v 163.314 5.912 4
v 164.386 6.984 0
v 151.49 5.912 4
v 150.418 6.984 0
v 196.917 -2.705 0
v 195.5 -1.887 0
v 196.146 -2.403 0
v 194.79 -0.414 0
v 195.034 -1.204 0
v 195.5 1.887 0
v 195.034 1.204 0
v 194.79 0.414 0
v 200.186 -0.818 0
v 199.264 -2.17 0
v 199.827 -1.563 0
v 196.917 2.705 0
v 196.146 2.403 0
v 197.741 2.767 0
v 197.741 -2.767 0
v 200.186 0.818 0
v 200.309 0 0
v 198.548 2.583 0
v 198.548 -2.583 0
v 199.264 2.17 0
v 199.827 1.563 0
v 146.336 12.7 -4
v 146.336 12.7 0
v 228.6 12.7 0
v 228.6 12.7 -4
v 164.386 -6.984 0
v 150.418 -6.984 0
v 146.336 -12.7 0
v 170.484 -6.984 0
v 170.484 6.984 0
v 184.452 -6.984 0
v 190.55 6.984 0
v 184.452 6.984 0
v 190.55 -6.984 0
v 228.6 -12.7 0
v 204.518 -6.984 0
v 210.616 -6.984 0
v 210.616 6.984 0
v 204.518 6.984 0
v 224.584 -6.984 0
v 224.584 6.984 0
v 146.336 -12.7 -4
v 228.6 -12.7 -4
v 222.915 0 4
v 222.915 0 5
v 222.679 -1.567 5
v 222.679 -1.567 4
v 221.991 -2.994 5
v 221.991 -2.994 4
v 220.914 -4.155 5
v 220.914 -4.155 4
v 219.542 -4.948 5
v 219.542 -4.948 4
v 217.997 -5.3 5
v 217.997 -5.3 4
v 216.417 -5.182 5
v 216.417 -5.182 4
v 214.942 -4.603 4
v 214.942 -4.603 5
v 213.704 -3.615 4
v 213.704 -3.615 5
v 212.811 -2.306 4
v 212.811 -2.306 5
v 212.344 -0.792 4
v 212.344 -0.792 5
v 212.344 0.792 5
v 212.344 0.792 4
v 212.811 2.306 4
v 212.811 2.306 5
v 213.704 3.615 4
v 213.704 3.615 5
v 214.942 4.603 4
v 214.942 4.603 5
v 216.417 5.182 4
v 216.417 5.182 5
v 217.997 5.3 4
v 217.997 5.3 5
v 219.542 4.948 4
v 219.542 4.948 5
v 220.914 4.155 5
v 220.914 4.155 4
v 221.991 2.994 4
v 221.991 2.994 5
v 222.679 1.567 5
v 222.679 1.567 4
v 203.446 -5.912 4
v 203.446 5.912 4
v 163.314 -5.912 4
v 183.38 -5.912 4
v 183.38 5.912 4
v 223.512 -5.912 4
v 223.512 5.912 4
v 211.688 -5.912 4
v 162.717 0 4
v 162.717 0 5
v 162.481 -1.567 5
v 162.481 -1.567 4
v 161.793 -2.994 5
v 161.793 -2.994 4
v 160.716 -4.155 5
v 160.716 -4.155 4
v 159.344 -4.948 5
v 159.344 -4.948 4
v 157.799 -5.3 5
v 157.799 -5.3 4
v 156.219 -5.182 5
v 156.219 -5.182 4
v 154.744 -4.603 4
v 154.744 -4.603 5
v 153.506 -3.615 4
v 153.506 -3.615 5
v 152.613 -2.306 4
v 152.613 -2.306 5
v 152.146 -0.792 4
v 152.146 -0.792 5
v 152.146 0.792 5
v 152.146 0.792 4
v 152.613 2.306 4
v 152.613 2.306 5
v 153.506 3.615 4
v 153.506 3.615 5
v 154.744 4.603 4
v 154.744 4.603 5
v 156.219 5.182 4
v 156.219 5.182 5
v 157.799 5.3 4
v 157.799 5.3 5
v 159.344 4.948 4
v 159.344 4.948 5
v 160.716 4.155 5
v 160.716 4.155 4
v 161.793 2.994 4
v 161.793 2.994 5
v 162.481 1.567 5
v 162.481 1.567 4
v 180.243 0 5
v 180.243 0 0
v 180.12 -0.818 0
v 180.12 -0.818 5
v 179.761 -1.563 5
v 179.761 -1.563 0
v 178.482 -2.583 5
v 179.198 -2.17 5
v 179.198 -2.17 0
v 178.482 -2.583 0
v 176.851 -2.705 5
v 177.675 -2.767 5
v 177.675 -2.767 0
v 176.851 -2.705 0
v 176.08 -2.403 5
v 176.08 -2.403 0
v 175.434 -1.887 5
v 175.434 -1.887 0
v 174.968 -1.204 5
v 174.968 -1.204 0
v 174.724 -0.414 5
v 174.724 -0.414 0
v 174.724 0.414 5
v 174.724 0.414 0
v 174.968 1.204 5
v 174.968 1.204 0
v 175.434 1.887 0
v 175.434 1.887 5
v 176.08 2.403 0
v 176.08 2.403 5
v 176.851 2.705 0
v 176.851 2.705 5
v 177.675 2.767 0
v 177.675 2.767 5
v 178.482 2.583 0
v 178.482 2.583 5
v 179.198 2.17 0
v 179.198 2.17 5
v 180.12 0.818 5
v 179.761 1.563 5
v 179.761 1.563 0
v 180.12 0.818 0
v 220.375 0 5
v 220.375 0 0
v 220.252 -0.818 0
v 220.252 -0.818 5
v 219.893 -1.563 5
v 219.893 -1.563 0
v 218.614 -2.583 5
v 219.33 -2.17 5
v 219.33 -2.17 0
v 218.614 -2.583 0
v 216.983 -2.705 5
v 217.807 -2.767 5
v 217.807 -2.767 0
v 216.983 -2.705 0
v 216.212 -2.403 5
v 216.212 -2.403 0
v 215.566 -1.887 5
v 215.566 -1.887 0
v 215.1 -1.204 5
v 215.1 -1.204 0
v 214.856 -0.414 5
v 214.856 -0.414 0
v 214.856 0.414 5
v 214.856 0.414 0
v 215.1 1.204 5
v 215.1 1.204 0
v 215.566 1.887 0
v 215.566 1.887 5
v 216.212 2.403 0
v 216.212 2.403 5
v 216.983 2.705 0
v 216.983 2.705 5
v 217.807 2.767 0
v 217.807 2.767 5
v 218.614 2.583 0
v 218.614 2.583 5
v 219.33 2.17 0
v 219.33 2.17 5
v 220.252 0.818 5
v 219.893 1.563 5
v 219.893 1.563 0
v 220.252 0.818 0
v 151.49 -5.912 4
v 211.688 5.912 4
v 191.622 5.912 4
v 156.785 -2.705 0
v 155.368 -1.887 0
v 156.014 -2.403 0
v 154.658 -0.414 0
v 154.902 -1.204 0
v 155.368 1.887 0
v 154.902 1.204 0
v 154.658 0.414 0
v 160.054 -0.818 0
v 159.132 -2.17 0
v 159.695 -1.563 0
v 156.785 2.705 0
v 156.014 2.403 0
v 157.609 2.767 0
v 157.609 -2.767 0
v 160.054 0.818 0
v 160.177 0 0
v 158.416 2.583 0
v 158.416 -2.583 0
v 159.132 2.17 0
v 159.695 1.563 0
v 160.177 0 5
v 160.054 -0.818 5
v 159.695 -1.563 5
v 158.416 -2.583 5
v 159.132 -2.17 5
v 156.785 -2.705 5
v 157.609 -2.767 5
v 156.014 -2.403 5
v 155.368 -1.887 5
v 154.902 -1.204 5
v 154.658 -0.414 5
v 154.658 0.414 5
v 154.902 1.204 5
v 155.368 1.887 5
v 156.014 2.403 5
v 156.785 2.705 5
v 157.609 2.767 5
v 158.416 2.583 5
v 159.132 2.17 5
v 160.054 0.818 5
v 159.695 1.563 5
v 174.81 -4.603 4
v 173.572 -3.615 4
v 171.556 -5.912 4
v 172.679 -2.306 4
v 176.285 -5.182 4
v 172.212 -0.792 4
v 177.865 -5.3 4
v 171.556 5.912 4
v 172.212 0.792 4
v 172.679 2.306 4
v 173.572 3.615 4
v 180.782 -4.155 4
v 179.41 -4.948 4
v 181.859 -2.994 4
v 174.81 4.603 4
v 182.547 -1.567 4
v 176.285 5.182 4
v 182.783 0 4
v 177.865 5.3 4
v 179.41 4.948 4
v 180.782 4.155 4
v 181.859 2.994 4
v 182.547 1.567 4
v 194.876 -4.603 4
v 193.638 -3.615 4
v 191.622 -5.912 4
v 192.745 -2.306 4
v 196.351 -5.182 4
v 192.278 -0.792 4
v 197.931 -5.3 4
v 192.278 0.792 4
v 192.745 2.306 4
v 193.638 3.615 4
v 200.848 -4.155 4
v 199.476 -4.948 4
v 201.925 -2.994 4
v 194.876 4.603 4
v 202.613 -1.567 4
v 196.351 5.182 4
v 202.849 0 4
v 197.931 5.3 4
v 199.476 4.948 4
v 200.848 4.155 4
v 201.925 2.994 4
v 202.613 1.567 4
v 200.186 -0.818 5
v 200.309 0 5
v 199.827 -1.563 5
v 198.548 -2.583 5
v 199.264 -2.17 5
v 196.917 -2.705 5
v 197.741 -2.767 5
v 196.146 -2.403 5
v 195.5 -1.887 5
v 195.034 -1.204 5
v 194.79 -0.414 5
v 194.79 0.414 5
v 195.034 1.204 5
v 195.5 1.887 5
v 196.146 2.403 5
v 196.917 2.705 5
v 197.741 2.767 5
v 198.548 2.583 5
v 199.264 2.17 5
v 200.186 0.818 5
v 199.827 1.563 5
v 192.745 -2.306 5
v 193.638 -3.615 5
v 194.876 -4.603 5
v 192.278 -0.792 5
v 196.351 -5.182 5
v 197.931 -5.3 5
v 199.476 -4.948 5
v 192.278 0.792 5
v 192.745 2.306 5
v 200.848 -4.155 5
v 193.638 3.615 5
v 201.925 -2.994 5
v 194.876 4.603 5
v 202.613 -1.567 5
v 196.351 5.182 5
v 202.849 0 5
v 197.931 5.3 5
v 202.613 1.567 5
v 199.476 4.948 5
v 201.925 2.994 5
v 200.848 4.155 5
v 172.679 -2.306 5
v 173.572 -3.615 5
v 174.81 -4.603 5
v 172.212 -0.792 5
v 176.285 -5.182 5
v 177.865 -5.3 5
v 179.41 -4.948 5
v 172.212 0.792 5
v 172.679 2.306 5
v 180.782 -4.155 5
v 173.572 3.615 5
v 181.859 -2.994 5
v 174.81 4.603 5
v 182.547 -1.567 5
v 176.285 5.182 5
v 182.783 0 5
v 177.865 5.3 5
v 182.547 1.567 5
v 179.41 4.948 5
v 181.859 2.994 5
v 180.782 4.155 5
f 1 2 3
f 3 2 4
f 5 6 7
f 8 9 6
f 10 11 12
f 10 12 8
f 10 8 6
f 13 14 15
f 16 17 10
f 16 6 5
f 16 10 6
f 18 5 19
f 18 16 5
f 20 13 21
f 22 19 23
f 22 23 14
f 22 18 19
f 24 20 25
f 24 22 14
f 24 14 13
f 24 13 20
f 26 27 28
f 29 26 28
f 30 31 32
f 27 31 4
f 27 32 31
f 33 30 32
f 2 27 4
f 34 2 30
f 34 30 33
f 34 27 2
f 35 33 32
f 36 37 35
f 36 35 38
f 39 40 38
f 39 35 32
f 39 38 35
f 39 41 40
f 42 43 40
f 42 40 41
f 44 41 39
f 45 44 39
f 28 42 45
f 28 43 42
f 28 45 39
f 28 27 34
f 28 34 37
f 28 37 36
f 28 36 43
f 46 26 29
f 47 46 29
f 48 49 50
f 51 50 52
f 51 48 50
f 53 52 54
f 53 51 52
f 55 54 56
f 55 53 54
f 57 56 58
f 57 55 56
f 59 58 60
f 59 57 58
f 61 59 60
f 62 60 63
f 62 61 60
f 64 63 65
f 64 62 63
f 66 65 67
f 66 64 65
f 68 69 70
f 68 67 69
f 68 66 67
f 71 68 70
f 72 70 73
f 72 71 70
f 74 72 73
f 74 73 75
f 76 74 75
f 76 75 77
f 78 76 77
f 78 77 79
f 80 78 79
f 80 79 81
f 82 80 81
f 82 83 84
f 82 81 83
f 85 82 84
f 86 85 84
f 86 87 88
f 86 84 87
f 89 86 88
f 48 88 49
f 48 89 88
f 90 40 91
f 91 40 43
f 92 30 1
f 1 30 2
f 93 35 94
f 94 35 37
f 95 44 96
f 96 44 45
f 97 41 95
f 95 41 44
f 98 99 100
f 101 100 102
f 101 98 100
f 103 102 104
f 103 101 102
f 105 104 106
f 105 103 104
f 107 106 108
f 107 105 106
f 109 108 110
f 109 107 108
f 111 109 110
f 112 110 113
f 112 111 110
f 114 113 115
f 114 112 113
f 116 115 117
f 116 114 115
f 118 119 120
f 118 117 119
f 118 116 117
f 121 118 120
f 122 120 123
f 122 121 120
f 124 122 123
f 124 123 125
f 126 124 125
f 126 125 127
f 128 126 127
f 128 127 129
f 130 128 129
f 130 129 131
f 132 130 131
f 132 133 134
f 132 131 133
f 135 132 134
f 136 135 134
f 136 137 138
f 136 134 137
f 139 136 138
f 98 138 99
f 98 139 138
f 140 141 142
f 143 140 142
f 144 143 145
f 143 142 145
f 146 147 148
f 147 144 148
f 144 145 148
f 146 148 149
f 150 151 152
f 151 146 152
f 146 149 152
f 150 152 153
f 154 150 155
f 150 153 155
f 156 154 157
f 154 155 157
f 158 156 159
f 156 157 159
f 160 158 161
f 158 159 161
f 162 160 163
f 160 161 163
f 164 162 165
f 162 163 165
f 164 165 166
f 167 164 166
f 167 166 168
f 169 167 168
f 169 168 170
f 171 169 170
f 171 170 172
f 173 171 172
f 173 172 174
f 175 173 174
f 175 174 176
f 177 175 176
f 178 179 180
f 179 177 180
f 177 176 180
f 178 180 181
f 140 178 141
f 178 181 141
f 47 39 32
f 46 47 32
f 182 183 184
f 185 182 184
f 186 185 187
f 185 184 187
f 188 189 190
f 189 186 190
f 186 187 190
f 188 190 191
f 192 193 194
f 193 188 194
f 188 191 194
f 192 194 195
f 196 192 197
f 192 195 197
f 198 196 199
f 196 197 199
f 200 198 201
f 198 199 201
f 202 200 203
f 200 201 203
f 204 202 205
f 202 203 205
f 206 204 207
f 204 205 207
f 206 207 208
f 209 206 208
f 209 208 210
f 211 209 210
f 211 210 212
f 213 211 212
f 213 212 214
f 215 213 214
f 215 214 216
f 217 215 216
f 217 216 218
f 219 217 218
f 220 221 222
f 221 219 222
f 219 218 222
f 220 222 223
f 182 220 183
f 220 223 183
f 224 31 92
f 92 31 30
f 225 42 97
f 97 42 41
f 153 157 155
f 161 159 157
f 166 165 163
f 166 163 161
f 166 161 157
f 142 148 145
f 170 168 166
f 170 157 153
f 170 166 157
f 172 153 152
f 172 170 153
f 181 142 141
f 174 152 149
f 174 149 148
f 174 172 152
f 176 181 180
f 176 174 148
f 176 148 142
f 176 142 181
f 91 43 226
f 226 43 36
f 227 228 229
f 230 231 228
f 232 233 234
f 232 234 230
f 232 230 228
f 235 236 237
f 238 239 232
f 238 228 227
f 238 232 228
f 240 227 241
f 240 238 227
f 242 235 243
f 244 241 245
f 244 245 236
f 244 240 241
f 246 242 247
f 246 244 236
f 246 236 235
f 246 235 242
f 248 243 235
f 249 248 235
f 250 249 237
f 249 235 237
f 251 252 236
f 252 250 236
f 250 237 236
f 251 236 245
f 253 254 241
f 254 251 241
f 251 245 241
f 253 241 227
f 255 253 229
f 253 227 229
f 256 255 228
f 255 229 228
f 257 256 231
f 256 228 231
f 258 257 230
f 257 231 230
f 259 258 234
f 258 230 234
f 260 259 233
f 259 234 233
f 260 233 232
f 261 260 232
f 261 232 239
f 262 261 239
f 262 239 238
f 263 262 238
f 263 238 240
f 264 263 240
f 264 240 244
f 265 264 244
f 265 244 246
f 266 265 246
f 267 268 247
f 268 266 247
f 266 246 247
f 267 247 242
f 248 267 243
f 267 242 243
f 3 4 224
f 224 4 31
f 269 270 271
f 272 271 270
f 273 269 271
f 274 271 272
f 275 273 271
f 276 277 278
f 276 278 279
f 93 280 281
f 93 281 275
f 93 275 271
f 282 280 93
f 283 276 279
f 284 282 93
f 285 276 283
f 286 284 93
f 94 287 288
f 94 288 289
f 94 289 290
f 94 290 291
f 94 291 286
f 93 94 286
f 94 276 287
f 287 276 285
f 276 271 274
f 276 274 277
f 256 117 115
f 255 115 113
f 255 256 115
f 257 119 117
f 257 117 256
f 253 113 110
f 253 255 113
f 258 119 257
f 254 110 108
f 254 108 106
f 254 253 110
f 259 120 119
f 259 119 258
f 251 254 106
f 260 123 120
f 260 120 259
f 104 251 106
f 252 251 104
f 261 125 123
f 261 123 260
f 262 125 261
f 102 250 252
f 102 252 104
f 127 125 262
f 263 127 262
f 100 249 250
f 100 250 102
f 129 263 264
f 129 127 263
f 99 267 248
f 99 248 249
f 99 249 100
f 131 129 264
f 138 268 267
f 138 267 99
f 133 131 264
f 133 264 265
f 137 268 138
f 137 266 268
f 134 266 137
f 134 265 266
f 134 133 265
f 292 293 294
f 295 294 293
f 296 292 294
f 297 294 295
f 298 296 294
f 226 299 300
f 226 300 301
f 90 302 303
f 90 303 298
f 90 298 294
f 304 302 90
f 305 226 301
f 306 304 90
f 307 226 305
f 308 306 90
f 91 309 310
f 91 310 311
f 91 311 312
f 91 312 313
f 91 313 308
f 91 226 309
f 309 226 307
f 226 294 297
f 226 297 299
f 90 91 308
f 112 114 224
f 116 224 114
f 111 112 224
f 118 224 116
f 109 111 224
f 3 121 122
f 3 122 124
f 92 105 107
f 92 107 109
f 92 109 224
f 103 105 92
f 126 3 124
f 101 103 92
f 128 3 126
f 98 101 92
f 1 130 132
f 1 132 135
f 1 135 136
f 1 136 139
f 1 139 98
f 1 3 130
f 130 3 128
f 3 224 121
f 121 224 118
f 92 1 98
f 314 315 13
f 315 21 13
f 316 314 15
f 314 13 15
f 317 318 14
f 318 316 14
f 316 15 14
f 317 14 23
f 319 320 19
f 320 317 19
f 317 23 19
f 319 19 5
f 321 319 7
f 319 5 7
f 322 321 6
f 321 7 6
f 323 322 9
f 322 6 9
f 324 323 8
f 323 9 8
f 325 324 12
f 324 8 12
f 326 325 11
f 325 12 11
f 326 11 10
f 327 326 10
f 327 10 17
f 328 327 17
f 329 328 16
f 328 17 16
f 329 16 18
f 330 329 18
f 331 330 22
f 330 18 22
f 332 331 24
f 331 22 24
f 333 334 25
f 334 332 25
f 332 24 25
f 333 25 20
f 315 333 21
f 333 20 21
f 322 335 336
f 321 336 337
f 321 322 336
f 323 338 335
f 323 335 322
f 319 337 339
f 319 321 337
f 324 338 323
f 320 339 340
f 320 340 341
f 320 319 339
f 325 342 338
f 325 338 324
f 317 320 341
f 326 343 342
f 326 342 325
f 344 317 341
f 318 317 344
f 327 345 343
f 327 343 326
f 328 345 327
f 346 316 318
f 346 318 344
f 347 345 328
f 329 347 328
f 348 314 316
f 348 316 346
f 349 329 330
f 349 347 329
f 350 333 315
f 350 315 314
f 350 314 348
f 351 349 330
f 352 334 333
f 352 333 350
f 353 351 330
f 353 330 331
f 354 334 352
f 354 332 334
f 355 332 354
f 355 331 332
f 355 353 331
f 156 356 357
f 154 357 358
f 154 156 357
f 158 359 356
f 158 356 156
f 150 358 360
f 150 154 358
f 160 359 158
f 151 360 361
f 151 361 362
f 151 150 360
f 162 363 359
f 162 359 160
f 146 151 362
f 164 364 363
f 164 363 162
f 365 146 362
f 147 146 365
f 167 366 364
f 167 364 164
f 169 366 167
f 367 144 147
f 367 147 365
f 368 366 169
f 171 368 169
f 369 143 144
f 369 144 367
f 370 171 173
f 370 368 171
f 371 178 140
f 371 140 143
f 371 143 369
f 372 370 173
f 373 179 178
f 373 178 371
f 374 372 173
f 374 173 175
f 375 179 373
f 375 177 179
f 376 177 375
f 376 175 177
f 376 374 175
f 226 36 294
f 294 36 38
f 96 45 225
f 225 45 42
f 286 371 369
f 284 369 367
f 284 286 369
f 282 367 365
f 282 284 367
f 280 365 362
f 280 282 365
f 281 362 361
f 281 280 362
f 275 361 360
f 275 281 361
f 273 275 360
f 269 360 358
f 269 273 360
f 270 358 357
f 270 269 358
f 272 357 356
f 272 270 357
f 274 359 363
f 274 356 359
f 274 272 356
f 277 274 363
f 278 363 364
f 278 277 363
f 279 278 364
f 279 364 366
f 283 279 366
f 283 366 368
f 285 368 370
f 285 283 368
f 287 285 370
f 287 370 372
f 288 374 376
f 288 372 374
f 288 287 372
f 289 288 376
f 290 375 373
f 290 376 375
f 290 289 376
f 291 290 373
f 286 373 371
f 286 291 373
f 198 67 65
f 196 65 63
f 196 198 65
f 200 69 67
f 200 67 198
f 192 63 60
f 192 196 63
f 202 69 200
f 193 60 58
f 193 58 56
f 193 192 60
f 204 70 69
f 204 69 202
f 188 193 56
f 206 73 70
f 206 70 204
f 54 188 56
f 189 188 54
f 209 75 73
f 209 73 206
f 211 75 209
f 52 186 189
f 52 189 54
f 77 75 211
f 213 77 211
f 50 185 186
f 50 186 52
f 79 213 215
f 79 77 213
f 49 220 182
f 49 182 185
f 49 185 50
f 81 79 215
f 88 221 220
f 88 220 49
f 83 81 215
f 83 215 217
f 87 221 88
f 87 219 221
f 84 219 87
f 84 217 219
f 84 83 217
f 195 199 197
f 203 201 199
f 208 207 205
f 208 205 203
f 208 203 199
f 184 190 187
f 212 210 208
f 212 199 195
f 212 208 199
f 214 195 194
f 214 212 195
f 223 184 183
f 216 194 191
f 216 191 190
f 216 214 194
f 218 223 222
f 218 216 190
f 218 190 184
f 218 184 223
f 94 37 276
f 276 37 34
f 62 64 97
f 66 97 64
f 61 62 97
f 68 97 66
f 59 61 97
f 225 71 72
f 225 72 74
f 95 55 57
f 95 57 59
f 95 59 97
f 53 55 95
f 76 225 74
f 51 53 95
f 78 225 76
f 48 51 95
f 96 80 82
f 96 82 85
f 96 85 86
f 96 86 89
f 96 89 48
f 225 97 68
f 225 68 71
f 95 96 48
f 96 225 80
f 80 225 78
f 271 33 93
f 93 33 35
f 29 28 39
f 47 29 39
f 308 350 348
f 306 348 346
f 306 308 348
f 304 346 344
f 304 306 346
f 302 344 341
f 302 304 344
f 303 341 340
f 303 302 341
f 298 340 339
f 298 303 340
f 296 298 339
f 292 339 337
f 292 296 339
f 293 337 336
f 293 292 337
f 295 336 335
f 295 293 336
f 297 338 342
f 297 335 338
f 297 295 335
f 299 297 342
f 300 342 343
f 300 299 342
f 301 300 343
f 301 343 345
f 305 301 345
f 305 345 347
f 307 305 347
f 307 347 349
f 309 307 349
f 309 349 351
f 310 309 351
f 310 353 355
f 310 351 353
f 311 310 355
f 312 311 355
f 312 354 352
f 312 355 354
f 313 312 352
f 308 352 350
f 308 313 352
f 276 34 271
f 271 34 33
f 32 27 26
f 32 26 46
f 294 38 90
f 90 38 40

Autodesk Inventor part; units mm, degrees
ref_plane "YZ Plane" through (0, 0, 0) normal (1, 0, 0) x (0, 1, 0)
ref_plane "XZ Plane" through (0, 0, 0) normal (0, 1, 0) x (-1, 0, 0)
ref_plane "XY Plane" through (0, 0, 0) normal (0, 0, 1) x (1, 0, 0)
ref_plane "Work Plane1" through (0, 0, 0) normal (0, 0, 1) x (1, 0, 0)
ref_plane "Work Plane2" through (0, 0, 0) normal (0, 0, 1) x (1, 0, 0)
ref_plane "Work Plane3" through (0, 0, 0) normal (0, 0, 1) x (1, 0, 0)
sketch "Sketch1" plane through (0, 0, 0) normal (0, 0, 1) x (1, 0, 0)
  line L0 (232.95, -21.7) -> (142.052, -21.7)
  line L1 (142.052, -21.7) -> (142.052, 21.7)
  line L2 (142.052, 21.7) -> (232.95, 21.7)
  line L3 (232.95, 21.7) -> (232.95, -21.7)
  line L4 (148.402, -7.551111) -> (148.402, 7.551111)
  line L5 (226.6, 7.551111) -> (226.6, -7.551111)
  line L6 (205.085111, -9) -> (189.982889, -9)
  line L7 (188.534, 9) -> (206.534, 9)
  circle A0 centre (217.6, 0) radius 2.775
  circle A1 centre (217.6, 0) radius 5.315
  circle A2 centre (197.534, 0) radius 5.315
  circle A3 centre (177.468, 0) radius 5.315
  circle A4 centre (157.402, 0) radius 5.315
  circle A5 centre (217.6, 0) radius 2.775
  circle A6 centre (197.534, 0) radius 2.775
  circle A7 centre (177.468, 0) radius 2.775
  circle A8 centre (157.402, 0) radius 2.775
  line L8 (208.075, 9.906) -> (227.125, 9.906)
  line L9 (227.125, 9.906) -> (227.125, -9.906)
  line L10 (227.125, -9.906) -> (208.075, -9.906)
  line L11 (208.075, -9.906) -> (208.075, 9.906)
  line L12 (208.075, 9.906) -> (227.125, -9.906) construction
  line L13 (227.125, 9.906) -> (208.075, -9.906) construction
  line L14 (207.059, -9.906) -> (188.009, -9.906)
  line L15 (207.059, 9.906) -> (207.059, -9.906)
  line L16 (188.009, 9.906) -> (207.059, 9.906)
  line L17 (188.009, -9.906) -> (188.009, 9.906)
  line L18 (186.993, -9.906) -> (167.943, -9.906)
  line L19 (186.993, 9.906) -> (186.993, -9.906)
  line L20 (167.943, 9.906) -> (186.993, 9.906)
  line L21 (167.943, -9.906) -> (167.943, 9.906)
  line L22 (166.927, -9.906) -> (147.877, -9.906)
  line L23 (166.927, 9.906) -> (166.927, -9.906)
  line L24 (147.877, 9.906) -> (166.927, 9.906)
  line L25 (147.877, -9.906) -> (147.877, 9.906)
  point P0 (0, 0)
  dimension "d0" = 6.35
  dimension "d1" = 6.35
  dimension "d3" = 12.7
  dimension "d4" = 12.7
  dimension "d5" = 2.54
  dimension "d8" = 20.066
  dimension "d15" = 20.066
  dimension "d20" = 19.05
  dimension "d21" = 19.812
  dimension "d24" = 20.066
extrude "Extrusion1" add sketch "Sketch1" along normal blind 5 contours A1
sketch "Sketch3" plane through (0, 0, 0) normal (0, 0, 1) x (1, 0, 0)
  line L0 (225.6, -8) -> (209.6, -8) projected
  line L1 (225.6, 8) -> (225.6, -8) projected
  line L2 (209.6, 8) -> (225.6, 8) projected
  line L3 (209.6, -8) -> (209.6, 8) projected
  line L4 (210.616, -6.984) -> (224.584, -6.984)
  line L5 (224.584, -6.984) -> (224.584, 6.984)
  line L6 (224.584, 6.984) -> (210.616, 6.984)
  line L7 (210.616, 6.984) -> (210.616, -6.984)
  circle A0 centre (217.6, 0) radius 5.315 projected
  circle A1 centre (217.6, 0) radius 2.775 projected
  point P0 (0, 0)
  dimension "d40" = 1.016
sketch "Sketch3 outline for Extrusion3" plane through (0, 0, 0) normal (0, 0, 1) x (1, 0, 0)
  line L0 (210.616, -6.984) -> (224.584, -6.984)
  line L1 (210.616, 6.984) -> (210.616, -6.984)
  line L2 (224.584, -6.984) -> (224.584, 6.984)
  line L3 (224.584, 6.984) -> (210.616, 6.984)
  circle A0 centre (217.6, 0) radius 2.775
extrude "Extrusion3" add sketch "Sketch3 outline for Extrusion3" along normal blind 4 draft -15
pattern_linear "Rectangular Pattern1" count 4 spacing 20.066 along (-1, 0, 0) of "Extrusion3", "Extrusion1"
ref_plane "Work Plane4" through (0, 0, 0) normal (0, 0, 1) x (1, 0, 0)
sketch "Sketch4" plane through (0, 0, 0) normal (0, 0, 1) x (1, 0, 0)
  line L0 (-228.6, 12.7) -> (228.6, 12.7) projected
  line L1 (228.6, -12.7) -> (-228.6, -12.7) projected
  line L2 (228.6, 12.7) -> (228.6, -12.7) projected
  line L3 (146.336, 9) -> (146.336, -9) projected
  line L4 (228.6, 12.7) -> (146.336, 12.7)
  line L5 (146.336, 12.7) -> (146.336, -12.7)
  line L6 (146.336, -12.7) -> (228.6, -12.7)
  line L7 (228.6, -12.7) -> (228.6, 12.7)
  point P0 (0, 0)
extrude "Extrusion4" add sketch "Sketch4" against normal blind 4
properties part number "Bottom Holder"
